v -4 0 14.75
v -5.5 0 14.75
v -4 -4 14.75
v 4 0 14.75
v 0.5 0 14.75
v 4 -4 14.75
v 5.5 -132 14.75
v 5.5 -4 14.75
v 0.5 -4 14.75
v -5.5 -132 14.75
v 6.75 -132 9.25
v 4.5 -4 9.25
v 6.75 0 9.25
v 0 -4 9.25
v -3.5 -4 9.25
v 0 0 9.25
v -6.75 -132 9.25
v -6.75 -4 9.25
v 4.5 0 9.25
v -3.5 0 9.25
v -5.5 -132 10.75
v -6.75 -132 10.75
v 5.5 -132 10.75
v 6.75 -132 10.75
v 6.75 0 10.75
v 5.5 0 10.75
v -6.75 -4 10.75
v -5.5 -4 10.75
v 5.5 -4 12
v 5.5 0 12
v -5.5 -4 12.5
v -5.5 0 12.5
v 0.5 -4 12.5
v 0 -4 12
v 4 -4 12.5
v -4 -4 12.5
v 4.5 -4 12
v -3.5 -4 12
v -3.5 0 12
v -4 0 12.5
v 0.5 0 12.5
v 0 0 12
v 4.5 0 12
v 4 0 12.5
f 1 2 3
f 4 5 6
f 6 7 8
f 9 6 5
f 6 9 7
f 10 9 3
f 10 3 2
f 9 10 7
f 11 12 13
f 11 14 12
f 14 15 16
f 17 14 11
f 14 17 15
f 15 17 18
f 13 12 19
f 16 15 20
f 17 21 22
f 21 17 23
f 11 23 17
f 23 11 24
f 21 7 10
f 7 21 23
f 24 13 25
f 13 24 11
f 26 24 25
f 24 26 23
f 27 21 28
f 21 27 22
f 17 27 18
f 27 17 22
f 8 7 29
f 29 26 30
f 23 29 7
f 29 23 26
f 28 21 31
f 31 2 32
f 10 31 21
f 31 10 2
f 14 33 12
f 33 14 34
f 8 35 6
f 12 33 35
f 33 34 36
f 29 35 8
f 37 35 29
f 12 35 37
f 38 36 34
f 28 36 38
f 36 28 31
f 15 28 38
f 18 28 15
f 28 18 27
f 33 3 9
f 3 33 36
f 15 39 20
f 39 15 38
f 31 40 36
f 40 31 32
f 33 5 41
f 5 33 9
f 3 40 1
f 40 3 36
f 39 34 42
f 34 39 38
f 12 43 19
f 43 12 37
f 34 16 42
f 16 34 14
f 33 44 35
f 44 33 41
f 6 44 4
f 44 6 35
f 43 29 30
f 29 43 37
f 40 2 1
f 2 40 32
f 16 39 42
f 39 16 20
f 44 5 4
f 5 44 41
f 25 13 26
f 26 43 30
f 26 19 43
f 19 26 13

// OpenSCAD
aqua_width = 240 - 40;
aqua_height = 315;
aqua_top_border = 25 + 1;
aqua_bottom_border = 25;
aqua_border_step = 2;
aqua_glass_height = aqua_height - aqua_top_border - aqua_bottom_border;

border = 2;

light_tape_width = 14;
light_case_width = light_tape_width + border * 3;

module button_hole(h = 18.5, button = [ 18.8, 6.7 ], center = false) {
    cube ([h, button[0]+0.4, button[1]+0.4], center = center);
}

module dc_hole(h=5.5, m=8, center = false) {
    rotate([0,90,0]) {
        cylinder(h = h, d = m + 0.2, center = center, $fn=60);
    }
}

module aqua_light_cover(l=aqua_glass_height, w=light_case_width,
                        full=false, flat=false, split=false,
                        top = true, bottom=true)
{
    if (split) {
        if (top) {
            difference() {
                aqua_light_cover(l, w, full, flat, false);
                translate([0,0, 0]) {
                    rotate(v=[1,0,0], a=90) {
                        splitter(40, 40, 200, step = 4);
                    }
                }
            }
        }
        if (bottom) {
            translate([0, 5, 0]) {
                difference() {
                    aqua_light_cover(l, w, full, flat, false);
                    translate ([0,-4, 0]) {
                        rotate(v=[1,0,0], a=90) {
                            splitter(40, 40, 200, step = 4, reverse = true);
                        }
                    }
                }
            }
        }
    } else {
    w=w - 2*border - 1;
    b=border - 0.5;
    union() {
        translate([0,0, aqua_top_border/2 + aqua_border_step]) {
            if (flat) {
                cube([w - 2*border + 1.5*b, l, b],
                      center=true);
            } else if (full) {
                translate([0,0, (-aqua_border_step - 2*border )/2]) {
                    cube([w - 2*border, l, aqua_border_step + border + b],
                         center=true);
                }
            } else {
                cube([w - 2*border, l, b], center=true);
            }
            if (!flat) {
            translate([ w/2 - 1.5* border, 0, - aqua_border_step/2 - border]) {
                cube([b, l, aqua_border_step + border + b], center=true);
                translate ([ b, 0, - aqua_border_step/2 - border/2]) {
                    cube([b, l, b], center=true);
                }
            }
            translate([ - w/2 + 1.5* border, 0, - aqua_border_step/2 - border]) {
                cube([b, l, aqua_border_step + border + b], center=true);
                translate ([ - b, 0, - aqua_border_step/2 - border/2]) {
                    cube([b, l, b], center=true);
                }
            }
            }
        }
    }
    }
}

module splitter(l, w, h, step=border*2, reverse=false) {
     union() {
        n = l / step;
        m = w / step;
        translate([0, 0, reverse ? h/2 : -h/2]) {
            cube([l, w, h], center=true);
        }
        translate ([ -l/2, -w/2 ]) {
            for (i = [0:n-1]) {
                for(j = [0:m-1]) {
                    if ( reverse ? (i % 2 != j % 2) : (i % 2 == j % 2)) {
                        translate ([i*step, j*step, - step]) {
                            cube([step + 0.5, step + 0.5, step * 2]);
                        }
                    }
                }
            }
        }
    }
}
module aqua_light_top_base() {
    union () {
        difference() {
            cube([aqua_width, aqua_top_border, aqua_top_border], center=true);
            translate([0,0, 2 * border]) {
                cube([aqua_width - 2 * border, aqua_top_border - 2 * border,
                      aqua_top_border], center = true);
            }
            translate([aqua_width / 2, 0, 0]) {
                button_hole(center = true);
            }
            translate([- aqua_width / 2, 0, 0]) {
                dc_hole(center = true);
            }
            translate ([- aqua_width / 2 + border, 0, aqua_top_border/2 - border]) {
                cube([2*border + 2, aqua_top_border - 2*border, 2 * border + 1], center = true);
            }
        }
        translate ([0, - aqua_top_border/2 + border*1.5, aqua_top_border / 2 - border / 2]) {
            cube([aqua_width, border, border], center=true);
        }
        translate ([0, - aqua_top_border/2 + border*1.5,
                    aqua_top_border / 2 - border / 2 - 2 * border - 0.5]) {
            cube([aqua_width, border, border], center=true);
        }
        translate ([0, aqua_top_border/2 - border*1.5, aqua_top_border / 2 - border / 2]) {
            cube([aqua_width, border, border], center=true);
        }
        translate ([0, aqua_top_border/2 - border*1.5,
                    aqua_top_border / 2 - border / 2 - 2 * border - 0.5]) {
            cube([aqua_width, border, border], center=true);
        }
    }
}

module aqua_light_top(n = 5) {
    tape_holes_edge = 20;
    tape_holes_step = (aqua_width - tape_holes_edge + light_tape_width + border )/n;
    difference() {
        aqua_light_top_base();
        for (i=[0:n-1]) {
            translate([aqua_width / 2 - tape_holes_edge - light_tape_width / 2 - border / 2 - i * tape_holes_step,
                       aqua_top_border/2, 2*border]) {
                cube([light_tape_width + border, 5*border, aqua_top_border],
                     center = true);
            }
        }
    }
    translate ([0, -aqua_top_border/2 + border/2,
                    aqua_top_border/2 + (aqua_border_step + 0.5)/2]) {
        cube([aqua_width/2, border, aqua_border_step + 0.5], center=true);
        translate( [0, border/2, (aqua_border_step + 0.5) / 2 + border / 4 ]) {
            cube([aqua_width/2, border * 2, border/2], center = true);
        }
    }
}

module aqua_light_case() {
    union() {
        difference() {
            cube([light_case_width, aqua_glass_height, aqua_top_border],
                center = true);
            translate([0, - 2 * border, 2 * border]) {
                cube([light_tape_width + border, aqua_glass_height, aqua_top_border],
                     center = true);
            }
            translate ([0, aqua_glass_height / 2, aqua_top_border - border - 0.25]) {
                cube([light_case_width - 4*border, 2*border, 2 * border + 0.5]);
            }
            translate ([0, aqua_glass_height / 2 - border, aqua_top_border/2 - border]) {
                cube([light_case_width - 2*border, 2*border + 2, 2 * border + 1], center = true);
            }
        }
        translate ([ - light_case_width/2 + border*1.5, -2*border, aqua_top_border / 2 - border / 2]) {
            cube([border, aqua_glass_height, border], center=true);
        }
        translate ([ - light_case_width/2 + border*1.5, -2*border,
                    aqua_top_border / 2 - border / 2 - 2 * border - 0.5]) {
            cube([border, aqua_glass_height, border], center=true);
        }
        translate ([light_case_width/2 - border*1.5, -2*border, aqua_top_border / 2 - border / 2]) {
            cube([border, aqua_glass_height, border], center=true);
        }
        translate ([light_case_width/2 - border*1.5, -2*border,
                    aqua_top_border / 2 - border / 2 - 2 * border - 0.5]) {
            cube([border, aqua_glass_height, border], center=true);
        }
    }
}

module aqua_light_case_split(top = true, bottom = true) {
    if (top) {
        difference() {
            aqua_light_case();
            translate([0,0,-3]) {
                rotate(v=[1,0,0], a=90) {
                    splitter(40, 40, 200, step = 8);
                }
            }
        }
    }
    if (bottom) {
        translate([0, 9, 0]) {
            difference() {
                aqua_light_case();
                translate ([0,-8,-3]) {
                    rotate(v=[1,0,0], a=90) {
                        splitter(40, 40, 200, step = 8, reverse = true);
                    }
                }
            }
        }
    }
}

module aqua_light(n=5, split = false, top_split = true, bottom_split = true) {
    tape_holes_edge = 20;
    tape_holes_step = (aqua_width - tape_holes_edge + light_tape_width + border )/n;
    difference () {
        union() {
            aqua_light_top(n=n);
            for (i=[0:n-1]) {
                translate([aqua_width / 2 - tape_holes_edge - light_tape_width / 2 - border / 2 - i * tape_holes_step,
                           aqua_glass_height / 2 + aqua_top_border / 2]) {
                    if(!split) {
                        aqua_light_case();
                    } else {
                        aqua_light_case_split(top_split, bottom_split);
                    }
                }
            }
        }
    }
}

*aqua_light_case_split();

*splitter(100, 100, 100, reverse = true);
*difference () {
    aqua_light_case_split(true, false);
    translate([0, -50 - 40, 0]) cube([40,120,40], center = true);
}
*difference () {
    aqua_light_case_split(false, true);
    translate([0, 50 + 40, 0]) cube([40,120,40], center = true);
}
*difference () {
    aqua_light_cover(full=true);
    translate([0, 50 + 40, 0]) cube([40,120,40], center = true);
    translate([0, -50 - 40, 0]) cube([40,120,40], center = true);
}

* aqua_light(split=false, bottom_split = false, top_split=true);
* aqua_light_case_split(false, true);
* translate([0, 0, -2.6*border]) {
    rotate(v=[0,0,1], a=90) {
        aqua_light_cover(flat=true, l = aqua_width - border,
                         w = aqua_top_border);
    }
}
aqua_light_cover(full=true, split=true, bottom=false);
